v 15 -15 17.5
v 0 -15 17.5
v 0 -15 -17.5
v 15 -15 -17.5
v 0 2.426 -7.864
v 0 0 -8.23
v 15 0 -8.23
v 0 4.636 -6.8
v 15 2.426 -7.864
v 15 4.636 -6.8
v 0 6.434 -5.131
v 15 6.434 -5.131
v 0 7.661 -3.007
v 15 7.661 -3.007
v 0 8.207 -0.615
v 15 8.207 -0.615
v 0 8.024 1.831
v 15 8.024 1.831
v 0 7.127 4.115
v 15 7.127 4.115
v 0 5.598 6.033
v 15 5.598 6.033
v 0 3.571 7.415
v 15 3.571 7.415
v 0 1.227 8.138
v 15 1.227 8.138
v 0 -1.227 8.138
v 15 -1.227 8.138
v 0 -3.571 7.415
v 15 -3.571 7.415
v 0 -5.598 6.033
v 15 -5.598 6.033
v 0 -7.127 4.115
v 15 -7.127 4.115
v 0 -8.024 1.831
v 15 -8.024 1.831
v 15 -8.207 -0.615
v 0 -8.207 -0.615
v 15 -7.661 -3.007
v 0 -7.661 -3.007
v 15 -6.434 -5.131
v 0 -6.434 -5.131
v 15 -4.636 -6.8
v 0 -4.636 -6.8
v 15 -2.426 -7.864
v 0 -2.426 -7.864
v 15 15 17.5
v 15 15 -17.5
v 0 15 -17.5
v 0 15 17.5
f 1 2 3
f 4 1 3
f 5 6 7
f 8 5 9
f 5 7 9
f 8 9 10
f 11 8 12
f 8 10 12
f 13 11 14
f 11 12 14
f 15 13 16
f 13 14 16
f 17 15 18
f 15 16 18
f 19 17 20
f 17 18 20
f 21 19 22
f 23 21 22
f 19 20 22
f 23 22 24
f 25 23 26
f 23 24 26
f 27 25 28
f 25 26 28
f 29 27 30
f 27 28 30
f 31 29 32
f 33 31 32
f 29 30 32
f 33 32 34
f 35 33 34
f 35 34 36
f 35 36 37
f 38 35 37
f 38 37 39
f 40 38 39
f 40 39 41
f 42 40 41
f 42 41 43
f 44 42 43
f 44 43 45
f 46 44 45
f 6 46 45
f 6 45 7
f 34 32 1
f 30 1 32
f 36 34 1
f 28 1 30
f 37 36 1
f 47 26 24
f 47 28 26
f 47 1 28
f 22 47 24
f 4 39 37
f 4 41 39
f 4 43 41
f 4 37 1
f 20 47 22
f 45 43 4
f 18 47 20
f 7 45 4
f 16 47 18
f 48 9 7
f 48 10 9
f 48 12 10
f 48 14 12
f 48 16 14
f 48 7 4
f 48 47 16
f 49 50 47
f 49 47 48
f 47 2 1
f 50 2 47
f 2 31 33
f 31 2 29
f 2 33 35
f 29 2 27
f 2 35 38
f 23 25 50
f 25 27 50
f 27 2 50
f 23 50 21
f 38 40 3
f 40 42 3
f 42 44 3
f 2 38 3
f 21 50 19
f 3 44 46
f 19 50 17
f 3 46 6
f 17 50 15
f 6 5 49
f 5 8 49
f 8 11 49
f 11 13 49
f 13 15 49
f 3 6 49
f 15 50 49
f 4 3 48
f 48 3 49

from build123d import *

# Parameters (mm, degrees)
SKETCH1_W           = 35
SKETCH1_H           = 30
BOSS_EXTRUDE1_DEPTH = 25
SKETCH2_R           = 8.23
CUT_EXTRUDE1_DEPTH  = 51
SKETCH3_W           = 35
SKETCH3_H           = 30
CUT_EXTRUDE2_DEPTH  = 5
SKETCH4_W           = 35
SKETCH4_H           = 30
CUT_EXTRUDE3_DEPTH  = 5


with BuildPart() as part:
    # Sketch1 → Boss-Extrude1 (new body)
    with BuildSketch(Plane(origin=(0, 0, 0), x_dir=(0, 0, -1), z_dir=(1, 0, 0))):
        Rectangle(SKETCH1_W, SKETCH1_H)
    extrude(amount=BOSS_EXTRUDE1_DEPTH)

    # Sketch2 → Cut-Extrude1 (cut)
    with BuildSketch(Plane(origin=(25, 0, 0), x_dir=(0, 0, -1), z_dir=(1, 0, 0))):
        Circle(SKETCH2_R)
    extrude(amount=-CUT_EXTRUDE1_DEPTH, mode=Mode.SUBTRACT)

    # Sketch3 → Cut-Extrude2 (cut)
    with BuildSketch(Plane(origin=(25, 0, 0), x_dir=(0, 0, -1), z_dir=(1, 0, 0))):
        Rectangle(SKETCH3_W, SKETCH3_H)
    extrude(amount=-CUT_EXTRUDE2_DEPTH, mode=Mode.SUBTRACT)

    # Sketch4 → Cut-Extrude3 (cut)
    with BuildSketch(Plane(origin=(20, 0, 0), x_dir=(0, 0, -1), z_dir=(1, 0, 0))):
        Rectangle(SKETCH4_W, SKETCH4_H)
    extrude(amount=-CUT_EXTRUDE3_DEPTH, mode=Mode.SUBTRACT)


solid = part.part
